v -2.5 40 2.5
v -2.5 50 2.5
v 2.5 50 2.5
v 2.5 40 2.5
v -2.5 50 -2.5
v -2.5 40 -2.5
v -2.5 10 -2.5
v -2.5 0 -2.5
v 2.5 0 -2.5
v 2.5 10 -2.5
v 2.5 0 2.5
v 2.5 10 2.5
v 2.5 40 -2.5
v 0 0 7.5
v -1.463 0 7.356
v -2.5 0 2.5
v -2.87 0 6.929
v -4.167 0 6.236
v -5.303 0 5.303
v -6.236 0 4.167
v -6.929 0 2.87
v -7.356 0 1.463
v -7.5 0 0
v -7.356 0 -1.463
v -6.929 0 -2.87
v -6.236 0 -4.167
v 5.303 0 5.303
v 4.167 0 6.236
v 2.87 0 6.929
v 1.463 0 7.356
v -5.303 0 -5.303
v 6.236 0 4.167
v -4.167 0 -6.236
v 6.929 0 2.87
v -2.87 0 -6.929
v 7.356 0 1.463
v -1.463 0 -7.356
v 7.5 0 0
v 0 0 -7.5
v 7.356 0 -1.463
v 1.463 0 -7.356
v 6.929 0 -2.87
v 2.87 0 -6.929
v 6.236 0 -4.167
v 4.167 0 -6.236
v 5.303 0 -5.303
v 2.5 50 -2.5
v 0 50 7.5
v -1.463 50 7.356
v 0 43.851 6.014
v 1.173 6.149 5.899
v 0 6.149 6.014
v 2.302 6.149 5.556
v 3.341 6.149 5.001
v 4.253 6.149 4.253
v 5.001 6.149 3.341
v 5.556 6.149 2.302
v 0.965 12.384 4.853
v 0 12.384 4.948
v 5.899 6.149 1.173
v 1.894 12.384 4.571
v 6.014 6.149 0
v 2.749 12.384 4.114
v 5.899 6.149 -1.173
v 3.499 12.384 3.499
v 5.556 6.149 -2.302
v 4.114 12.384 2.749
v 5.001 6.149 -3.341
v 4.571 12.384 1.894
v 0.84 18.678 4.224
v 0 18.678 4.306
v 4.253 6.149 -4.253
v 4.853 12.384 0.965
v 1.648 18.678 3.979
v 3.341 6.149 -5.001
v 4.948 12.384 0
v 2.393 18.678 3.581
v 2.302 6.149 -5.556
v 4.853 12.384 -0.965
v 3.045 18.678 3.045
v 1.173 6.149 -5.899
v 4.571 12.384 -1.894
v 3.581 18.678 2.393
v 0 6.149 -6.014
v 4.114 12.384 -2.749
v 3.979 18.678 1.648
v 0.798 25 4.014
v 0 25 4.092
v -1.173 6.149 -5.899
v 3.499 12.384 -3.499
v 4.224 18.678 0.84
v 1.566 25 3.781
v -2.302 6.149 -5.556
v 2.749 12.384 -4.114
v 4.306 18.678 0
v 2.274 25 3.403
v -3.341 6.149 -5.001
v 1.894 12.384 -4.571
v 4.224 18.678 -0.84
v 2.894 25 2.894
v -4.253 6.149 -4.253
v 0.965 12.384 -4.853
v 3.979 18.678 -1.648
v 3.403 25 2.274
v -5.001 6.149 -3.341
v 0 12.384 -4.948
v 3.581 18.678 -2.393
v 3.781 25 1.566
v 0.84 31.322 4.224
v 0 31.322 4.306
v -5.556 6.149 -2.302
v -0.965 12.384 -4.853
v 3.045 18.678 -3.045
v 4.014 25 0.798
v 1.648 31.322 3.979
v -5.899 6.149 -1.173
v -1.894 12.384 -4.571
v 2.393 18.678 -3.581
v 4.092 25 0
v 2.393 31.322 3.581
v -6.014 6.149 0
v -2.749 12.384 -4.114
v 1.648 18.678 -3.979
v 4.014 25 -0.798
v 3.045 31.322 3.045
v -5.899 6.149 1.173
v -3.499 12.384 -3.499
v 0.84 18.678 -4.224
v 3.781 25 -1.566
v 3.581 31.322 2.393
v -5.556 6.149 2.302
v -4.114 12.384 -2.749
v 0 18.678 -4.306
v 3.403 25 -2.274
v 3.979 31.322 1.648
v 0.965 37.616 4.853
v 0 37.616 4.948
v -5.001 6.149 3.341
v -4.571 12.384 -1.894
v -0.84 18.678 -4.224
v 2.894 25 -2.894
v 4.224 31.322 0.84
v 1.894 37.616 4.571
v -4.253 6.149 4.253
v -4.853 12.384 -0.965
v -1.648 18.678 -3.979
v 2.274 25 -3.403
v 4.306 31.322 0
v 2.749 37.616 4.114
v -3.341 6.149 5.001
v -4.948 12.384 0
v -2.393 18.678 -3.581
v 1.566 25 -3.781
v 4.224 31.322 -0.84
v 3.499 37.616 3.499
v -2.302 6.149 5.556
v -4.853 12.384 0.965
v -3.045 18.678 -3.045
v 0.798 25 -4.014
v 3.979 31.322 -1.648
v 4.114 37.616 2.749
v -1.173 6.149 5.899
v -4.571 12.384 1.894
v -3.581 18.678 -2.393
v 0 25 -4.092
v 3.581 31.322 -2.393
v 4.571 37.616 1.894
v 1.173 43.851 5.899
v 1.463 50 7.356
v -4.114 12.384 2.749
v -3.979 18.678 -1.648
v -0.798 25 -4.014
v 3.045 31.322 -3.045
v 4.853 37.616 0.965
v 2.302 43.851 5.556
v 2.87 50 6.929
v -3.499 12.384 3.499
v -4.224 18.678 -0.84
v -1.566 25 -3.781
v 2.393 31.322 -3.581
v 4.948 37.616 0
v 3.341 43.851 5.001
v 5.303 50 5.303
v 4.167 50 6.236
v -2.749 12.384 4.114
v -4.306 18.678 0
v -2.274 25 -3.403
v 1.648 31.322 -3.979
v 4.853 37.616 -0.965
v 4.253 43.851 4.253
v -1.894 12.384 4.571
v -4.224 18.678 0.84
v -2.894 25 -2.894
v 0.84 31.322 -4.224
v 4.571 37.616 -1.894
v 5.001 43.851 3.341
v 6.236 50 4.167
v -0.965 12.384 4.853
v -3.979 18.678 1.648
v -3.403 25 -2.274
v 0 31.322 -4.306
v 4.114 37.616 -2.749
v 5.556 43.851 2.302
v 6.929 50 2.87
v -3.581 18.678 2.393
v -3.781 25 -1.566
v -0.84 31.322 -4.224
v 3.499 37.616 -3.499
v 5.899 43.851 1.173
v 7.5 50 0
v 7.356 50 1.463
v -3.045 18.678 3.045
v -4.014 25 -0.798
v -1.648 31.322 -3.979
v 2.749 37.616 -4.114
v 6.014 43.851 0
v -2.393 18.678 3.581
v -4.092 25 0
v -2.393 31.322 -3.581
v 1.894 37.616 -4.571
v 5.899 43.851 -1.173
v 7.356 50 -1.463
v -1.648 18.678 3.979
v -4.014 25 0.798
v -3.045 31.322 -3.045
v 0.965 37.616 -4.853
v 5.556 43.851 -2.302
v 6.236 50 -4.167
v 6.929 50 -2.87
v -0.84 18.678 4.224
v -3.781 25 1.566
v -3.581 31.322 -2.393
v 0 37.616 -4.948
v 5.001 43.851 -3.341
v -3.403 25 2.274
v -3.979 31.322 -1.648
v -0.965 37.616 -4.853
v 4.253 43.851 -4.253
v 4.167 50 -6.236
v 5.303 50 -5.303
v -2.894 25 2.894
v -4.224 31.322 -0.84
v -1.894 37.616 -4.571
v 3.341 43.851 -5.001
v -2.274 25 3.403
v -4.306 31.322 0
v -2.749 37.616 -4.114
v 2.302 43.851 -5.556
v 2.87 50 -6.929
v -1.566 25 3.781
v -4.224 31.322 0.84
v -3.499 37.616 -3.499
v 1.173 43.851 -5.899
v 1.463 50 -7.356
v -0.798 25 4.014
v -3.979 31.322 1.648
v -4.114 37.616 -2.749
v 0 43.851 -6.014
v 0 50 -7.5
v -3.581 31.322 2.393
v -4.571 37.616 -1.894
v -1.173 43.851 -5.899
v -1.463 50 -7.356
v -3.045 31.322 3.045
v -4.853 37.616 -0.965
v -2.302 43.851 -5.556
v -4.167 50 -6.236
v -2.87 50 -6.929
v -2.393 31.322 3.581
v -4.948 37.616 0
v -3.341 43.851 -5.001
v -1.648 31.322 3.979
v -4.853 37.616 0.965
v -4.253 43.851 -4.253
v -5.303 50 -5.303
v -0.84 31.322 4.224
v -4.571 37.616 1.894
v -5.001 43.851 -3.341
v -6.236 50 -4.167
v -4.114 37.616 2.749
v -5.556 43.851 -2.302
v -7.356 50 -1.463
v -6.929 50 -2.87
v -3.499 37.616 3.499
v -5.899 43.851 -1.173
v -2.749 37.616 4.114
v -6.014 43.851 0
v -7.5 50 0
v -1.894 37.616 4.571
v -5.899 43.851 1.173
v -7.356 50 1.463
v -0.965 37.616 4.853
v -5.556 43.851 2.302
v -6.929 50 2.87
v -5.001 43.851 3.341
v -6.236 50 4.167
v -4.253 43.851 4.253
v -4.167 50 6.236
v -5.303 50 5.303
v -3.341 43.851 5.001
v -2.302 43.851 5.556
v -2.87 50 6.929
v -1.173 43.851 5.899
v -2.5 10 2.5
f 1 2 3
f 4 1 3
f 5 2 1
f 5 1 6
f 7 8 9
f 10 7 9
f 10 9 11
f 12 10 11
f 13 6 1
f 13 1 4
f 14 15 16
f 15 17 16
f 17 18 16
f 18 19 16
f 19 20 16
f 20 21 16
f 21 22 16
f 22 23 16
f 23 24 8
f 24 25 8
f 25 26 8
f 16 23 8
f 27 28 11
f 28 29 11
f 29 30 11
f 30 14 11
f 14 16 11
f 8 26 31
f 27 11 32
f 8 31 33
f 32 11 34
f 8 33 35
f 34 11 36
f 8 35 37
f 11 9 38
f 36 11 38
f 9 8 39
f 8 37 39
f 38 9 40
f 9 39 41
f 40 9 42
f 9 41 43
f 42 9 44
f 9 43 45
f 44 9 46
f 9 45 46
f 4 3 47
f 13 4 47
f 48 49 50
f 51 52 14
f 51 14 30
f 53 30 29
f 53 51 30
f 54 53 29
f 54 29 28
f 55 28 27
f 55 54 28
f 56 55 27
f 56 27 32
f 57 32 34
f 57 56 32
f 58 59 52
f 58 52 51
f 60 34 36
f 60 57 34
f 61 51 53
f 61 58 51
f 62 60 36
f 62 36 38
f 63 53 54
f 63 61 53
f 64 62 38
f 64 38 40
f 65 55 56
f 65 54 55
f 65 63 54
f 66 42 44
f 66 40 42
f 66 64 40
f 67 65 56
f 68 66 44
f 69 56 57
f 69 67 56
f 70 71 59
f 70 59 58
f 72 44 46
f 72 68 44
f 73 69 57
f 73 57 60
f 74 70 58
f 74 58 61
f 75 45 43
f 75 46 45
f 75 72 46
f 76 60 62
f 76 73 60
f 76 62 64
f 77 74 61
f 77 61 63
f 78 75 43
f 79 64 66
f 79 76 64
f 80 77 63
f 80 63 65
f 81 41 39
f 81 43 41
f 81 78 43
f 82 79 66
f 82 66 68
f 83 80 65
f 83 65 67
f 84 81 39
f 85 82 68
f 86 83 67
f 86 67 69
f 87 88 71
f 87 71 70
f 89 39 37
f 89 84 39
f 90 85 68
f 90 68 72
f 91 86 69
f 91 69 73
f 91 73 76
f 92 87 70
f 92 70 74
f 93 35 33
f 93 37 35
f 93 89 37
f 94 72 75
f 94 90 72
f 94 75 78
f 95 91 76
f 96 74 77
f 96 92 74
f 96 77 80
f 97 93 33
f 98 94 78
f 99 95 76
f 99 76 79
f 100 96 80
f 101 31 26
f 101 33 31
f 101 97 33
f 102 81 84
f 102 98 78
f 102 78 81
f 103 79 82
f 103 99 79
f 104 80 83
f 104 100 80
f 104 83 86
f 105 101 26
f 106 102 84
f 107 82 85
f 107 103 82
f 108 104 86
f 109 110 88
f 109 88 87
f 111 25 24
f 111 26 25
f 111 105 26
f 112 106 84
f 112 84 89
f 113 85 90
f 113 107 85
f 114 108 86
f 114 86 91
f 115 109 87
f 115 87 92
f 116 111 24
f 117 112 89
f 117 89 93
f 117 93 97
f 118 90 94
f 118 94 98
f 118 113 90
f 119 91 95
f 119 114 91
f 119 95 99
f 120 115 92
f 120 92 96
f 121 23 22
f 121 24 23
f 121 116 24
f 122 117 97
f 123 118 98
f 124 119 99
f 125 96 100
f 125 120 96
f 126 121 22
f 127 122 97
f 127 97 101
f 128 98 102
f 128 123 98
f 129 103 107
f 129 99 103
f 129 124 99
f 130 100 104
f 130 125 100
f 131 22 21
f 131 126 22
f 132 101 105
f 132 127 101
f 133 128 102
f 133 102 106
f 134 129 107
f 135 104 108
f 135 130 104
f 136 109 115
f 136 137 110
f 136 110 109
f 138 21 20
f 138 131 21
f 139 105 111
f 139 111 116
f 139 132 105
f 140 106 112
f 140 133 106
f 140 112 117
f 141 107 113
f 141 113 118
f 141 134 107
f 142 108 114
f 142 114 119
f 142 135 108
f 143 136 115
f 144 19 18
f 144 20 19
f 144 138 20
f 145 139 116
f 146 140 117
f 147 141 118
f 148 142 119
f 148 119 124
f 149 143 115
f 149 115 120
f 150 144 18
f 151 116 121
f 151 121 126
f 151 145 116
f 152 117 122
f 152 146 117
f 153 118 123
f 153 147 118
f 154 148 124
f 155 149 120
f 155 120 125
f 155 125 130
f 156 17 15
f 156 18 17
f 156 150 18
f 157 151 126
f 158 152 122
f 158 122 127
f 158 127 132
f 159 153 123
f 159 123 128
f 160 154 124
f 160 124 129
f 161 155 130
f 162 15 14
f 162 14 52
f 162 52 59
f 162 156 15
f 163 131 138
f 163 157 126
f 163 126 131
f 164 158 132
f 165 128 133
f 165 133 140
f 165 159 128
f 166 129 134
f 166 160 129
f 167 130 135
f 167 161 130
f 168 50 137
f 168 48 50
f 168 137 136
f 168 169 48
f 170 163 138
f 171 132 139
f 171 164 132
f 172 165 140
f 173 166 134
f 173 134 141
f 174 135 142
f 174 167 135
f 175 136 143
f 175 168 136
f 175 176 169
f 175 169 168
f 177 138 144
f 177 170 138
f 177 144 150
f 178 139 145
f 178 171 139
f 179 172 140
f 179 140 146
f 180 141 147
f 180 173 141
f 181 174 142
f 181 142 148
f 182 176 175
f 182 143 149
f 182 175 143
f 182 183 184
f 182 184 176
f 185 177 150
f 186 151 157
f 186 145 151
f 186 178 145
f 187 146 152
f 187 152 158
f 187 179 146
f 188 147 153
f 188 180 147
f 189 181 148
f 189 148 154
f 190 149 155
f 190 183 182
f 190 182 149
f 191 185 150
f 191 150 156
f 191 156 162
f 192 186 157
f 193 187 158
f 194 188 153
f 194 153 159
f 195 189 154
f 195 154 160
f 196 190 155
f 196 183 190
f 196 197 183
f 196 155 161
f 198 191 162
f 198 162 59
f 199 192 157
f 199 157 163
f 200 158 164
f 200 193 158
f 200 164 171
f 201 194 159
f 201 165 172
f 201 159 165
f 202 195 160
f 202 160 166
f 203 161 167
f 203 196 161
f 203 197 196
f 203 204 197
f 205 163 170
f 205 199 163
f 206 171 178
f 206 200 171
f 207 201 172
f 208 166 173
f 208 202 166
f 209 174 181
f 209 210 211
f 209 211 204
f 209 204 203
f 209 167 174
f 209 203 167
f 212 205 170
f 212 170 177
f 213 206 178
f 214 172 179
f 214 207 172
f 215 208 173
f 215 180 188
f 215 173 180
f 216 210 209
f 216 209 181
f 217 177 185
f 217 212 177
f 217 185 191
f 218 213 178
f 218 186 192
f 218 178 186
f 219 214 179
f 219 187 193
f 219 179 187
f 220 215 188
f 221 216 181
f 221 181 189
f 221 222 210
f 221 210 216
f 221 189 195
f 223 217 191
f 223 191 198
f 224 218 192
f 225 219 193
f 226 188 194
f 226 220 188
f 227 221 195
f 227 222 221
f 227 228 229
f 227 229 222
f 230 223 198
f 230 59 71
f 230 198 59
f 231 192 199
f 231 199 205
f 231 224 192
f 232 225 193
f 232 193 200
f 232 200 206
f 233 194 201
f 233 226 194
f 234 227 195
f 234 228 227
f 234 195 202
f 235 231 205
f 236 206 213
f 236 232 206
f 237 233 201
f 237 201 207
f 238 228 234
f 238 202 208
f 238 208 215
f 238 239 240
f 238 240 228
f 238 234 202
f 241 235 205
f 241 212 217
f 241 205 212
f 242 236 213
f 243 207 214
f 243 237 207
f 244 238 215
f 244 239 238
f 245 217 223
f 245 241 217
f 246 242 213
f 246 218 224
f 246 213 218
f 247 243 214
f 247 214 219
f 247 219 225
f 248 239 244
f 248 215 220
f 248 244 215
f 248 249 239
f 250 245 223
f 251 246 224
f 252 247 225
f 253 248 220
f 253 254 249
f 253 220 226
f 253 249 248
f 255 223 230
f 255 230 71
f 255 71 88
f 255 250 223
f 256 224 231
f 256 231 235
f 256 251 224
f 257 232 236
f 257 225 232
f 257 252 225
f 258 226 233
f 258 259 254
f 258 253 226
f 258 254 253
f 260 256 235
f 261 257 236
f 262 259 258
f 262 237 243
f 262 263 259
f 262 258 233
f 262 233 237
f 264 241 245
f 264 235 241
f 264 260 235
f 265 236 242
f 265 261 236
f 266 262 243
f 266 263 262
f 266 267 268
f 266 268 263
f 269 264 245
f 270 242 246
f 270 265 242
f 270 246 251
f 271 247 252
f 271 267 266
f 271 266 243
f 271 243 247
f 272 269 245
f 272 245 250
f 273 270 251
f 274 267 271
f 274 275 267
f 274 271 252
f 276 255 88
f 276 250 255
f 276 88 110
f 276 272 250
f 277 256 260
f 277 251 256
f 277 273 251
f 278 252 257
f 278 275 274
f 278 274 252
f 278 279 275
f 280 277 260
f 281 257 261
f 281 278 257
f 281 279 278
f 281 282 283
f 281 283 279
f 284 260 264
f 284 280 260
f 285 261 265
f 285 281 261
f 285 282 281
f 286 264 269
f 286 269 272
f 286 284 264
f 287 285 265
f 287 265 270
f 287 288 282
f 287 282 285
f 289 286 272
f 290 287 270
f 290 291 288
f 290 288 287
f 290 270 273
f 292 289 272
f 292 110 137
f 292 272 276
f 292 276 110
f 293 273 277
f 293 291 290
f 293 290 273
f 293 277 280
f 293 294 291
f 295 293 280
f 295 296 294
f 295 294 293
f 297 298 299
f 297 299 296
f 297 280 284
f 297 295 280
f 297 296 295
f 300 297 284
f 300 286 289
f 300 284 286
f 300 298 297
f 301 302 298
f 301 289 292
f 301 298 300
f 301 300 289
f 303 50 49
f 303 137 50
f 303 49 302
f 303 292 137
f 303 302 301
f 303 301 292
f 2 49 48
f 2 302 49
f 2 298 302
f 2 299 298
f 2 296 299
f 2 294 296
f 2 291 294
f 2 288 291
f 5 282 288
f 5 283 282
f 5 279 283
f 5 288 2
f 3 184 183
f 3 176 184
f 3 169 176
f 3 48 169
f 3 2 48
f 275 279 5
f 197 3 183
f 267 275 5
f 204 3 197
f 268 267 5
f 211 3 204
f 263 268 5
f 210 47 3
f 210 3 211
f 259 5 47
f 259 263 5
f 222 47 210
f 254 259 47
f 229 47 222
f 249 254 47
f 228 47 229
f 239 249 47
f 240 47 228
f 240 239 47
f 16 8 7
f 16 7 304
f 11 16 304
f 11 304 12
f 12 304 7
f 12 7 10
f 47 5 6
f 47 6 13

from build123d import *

# Parameters (mm, degrees)
SKETCH_1_R          = 7.5
EXTRUDE_1_DEPTH     = 50
SKETCH_2_W          = 5
SKETCH_2_H          = 5
CUT_EXTRUDE_1_DEPTH = 10
SKETCH_3_W          = 5
SKETCH_3_H          = 5
CUT_EXTRUDE_2_DEPTH = 10


with BuildPart() as part:
    # 草图1 → 凸台-拉伸1 (new body)
    with BuildSketch(Plane(origin=(0, 0, 0), x_dir=(1, 0, 0), z_dir=(0, 1, 0))):
        Circle(SKETCH_1_R)
    extrude(amount=EXTRUDE_1_DEPTH)

    # 草图2 → 切除-拉伸1 (cut)
    with BuildSketch(Plane(origin=(0, 50, 0), x_dir=(1, 0, 0), z_dir=(0, 1, 0))):
        Rectangle(SKETCH_2_W, SKETCH_2_H)
    extrude(amount=-CUT_EXTRUDE_1_DEPTH, mode=Mode.SUBTRACT)

    # 草图3 → 切除-拉伸2 (cut)
    with BuildSketch(Plane.XZ):
        Rectangle(SKETCH_3_W, SKETCH_3_H)
    extrude(amount=-CUT_EXTRUDE_2_DEPTH, mode=Mode.SUBTRACT)

    # 草图4 → 切除-旋转1 (revolve, cut)
    with BuildSketch(Plane(origin=(0, 0, 0), x_dir=(0, 0, -1), z_dir=(1, 0, 0))):
        with BuildLine():
            Line((-7.5, 50), (-7.5, 0))
            ThreePointArc((-7.5, 0), (-4.092291539, 25), (-7.5, 50))
        make_face()
    revolve(axis=Axis((0, 0, 0), (0, 1, 0)), mode=Mode.SUBTRACT)


solid = part.part
